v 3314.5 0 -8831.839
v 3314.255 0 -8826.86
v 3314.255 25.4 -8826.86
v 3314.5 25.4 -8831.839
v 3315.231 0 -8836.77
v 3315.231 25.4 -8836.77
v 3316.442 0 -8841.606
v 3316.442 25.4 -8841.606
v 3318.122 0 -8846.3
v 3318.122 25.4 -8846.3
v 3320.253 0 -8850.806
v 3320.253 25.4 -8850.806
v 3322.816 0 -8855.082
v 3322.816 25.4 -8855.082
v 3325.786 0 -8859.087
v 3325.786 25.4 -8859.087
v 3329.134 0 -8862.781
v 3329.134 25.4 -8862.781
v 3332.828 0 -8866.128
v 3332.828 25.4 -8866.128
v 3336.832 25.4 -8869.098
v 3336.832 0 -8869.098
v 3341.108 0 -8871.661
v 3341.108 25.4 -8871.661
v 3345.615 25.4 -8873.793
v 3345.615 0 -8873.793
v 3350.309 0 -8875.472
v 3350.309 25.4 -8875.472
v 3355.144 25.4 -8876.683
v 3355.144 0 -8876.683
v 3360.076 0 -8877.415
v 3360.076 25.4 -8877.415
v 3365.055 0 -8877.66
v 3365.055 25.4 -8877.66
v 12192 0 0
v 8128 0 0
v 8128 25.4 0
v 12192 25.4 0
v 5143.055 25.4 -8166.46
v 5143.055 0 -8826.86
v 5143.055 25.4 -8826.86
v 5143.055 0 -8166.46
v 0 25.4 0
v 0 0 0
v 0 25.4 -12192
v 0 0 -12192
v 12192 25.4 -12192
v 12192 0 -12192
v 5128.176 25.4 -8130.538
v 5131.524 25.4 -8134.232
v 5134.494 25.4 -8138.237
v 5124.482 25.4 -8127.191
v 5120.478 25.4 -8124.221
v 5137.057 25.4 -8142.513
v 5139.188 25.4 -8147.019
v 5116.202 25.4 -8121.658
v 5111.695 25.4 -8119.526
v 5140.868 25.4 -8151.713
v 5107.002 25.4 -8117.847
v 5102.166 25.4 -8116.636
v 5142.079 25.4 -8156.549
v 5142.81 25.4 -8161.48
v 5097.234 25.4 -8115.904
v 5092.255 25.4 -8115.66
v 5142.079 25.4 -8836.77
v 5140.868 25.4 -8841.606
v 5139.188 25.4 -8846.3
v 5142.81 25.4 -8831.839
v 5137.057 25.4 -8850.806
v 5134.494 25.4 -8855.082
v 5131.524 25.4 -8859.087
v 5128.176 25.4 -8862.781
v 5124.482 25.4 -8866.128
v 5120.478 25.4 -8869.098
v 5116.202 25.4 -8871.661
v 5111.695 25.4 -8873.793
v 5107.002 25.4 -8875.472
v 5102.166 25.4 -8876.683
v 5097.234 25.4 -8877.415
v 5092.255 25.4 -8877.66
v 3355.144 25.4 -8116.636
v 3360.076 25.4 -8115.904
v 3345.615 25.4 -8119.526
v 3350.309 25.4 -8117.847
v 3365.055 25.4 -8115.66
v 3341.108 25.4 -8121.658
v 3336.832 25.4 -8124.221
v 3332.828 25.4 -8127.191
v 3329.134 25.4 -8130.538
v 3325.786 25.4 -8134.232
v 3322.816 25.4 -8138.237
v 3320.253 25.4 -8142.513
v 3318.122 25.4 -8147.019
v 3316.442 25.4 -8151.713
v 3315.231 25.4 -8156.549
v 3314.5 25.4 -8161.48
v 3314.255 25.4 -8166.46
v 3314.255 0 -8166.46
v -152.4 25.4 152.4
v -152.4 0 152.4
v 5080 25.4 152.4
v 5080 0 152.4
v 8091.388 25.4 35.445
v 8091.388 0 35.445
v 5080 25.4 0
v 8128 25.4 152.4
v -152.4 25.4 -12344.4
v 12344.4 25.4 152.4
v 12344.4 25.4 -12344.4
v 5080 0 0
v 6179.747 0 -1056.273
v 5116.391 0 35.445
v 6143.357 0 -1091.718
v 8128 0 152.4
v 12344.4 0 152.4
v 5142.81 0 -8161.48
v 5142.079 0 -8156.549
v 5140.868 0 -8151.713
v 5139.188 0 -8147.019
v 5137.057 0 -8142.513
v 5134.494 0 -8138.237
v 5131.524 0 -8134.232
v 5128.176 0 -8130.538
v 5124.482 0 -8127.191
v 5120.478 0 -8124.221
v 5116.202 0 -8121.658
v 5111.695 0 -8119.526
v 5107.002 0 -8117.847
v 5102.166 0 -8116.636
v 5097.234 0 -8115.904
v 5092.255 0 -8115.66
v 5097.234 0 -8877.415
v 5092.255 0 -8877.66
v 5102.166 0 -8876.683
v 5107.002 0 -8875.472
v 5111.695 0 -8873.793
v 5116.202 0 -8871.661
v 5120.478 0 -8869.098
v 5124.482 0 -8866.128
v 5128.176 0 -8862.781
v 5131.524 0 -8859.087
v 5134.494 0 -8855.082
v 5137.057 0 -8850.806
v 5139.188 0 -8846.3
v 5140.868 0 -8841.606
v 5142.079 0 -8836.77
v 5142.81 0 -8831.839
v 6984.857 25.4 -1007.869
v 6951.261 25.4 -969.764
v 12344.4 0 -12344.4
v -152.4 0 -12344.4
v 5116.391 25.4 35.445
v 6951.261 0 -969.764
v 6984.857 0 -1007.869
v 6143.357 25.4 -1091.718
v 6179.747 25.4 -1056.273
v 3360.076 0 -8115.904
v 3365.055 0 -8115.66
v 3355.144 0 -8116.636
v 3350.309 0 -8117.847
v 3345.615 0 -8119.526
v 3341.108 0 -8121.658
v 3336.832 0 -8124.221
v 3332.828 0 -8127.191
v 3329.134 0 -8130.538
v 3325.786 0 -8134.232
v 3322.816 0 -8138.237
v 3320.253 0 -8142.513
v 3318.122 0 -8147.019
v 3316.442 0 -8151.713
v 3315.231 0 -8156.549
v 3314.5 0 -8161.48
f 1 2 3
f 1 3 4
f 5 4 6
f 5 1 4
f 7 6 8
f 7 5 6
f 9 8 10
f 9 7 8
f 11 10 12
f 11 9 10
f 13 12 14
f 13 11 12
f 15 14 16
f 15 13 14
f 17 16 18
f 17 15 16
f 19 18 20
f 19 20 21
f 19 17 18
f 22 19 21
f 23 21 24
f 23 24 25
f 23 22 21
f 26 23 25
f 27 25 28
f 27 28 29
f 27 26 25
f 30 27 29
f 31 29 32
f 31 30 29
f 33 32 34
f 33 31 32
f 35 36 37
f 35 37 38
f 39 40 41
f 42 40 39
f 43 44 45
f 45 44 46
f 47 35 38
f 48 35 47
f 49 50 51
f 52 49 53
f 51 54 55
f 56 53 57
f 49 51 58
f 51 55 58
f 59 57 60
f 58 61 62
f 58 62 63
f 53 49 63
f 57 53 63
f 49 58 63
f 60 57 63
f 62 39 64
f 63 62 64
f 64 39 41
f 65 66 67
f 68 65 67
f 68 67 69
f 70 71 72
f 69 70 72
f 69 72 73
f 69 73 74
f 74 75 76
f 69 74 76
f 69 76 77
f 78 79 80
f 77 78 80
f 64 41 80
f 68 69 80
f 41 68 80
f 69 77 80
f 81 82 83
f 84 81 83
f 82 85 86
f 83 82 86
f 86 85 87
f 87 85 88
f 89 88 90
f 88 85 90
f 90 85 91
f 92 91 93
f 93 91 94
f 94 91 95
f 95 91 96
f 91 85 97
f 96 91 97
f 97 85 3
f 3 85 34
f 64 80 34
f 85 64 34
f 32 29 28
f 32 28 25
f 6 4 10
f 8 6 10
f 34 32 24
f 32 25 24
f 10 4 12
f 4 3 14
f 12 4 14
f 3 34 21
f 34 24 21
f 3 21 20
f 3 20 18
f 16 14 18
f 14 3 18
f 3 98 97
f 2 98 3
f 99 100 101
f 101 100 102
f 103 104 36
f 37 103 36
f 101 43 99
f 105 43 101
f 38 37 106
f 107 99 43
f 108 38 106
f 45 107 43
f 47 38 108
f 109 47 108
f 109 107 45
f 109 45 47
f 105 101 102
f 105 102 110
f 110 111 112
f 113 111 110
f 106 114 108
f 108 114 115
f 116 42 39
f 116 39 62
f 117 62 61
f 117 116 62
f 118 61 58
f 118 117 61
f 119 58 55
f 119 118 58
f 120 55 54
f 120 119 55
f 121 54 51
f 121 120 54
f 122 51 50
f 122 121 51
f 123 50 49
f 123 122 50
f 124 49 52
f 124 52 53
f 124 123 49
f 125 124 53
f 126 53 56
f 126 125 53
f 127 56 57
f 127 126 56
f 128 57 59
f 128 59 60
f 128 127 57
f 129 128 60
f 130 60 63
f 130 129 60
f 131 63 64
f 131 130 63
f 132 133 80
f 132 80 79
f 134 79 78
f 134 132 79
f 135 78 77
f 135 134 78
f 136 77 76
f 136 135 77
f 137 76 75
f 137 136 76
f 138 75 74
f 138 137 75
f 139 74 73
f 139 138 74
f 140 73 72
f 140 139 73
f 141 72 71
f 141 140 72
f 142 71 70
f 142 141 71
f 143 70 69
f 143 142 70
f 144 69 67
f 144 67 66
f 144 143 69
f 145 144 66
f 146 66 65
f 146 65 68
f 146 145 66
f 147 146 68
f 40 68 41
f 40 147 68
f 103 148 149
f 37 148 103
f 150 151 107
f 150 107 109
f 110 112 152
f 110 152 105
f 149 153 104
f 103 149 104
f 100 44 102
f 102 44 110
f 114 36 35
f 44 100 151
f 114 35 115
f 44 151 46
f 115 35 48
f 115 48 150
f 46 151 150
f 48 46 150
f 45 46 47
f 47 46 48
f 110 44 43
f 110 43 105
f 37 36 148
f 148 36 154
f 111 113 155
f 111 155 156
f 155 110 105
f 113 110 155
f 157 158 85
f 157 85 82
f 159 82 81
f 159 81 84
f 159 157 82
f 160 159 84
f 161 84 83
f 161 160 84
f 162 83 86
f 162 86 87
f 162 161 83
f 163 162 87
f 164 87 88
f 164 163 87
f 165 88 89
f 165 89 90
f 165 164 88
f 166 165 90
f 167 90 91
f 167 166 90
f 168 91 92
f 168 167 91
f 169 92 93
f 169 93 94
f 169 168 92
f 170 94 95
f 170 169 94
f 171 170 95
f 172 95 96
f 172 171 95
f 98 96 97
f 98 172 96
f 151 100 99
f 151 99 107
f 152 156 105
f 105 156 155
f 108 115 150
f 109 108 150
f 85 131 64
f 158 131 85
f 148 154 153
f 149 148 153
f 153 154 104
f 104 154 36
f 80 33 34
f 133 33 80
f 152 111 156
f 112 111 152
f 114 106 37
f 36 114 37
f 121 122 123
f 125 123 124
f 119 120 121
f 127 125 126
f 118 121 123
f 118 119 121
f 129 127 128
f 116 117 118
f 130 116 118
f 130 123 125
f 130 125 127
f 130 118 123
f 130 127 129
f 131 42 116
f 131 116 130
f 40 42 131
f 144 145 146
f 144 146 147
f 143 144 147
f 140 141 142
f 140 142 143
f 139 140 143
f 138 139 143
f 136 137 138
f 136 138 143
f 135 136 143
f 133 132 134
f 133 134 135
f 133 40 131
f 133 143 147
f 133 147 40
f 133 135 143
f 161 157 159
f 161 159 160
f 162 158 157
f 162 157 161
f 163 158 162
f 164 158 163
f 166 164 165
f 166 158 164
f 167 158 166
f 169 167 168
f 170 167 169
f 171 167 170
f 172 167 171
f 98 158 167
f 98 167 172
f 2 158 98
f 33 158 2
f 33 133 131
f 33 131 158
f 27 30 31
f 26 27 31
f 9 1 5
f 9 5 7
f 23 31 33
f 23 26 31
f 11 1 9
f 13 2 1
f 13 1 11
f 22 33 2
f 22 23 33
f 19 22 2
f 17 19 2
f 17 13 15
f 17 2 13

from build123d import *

# Parameters (mm, degrees)
SKETCH1_W           = 12496.8
SKETCH1_H           = 12496.8
SKETCH1_W_2         = 12192
SKETCH1_H_2         = 12192
OUTSIDE_PERIM_DEPTH = 25.4
SKETCH2_W           = 3048
SKETCH2_H           = 152.4
DOORWAY_DEPTH       = 26.4
TABLE_DEPTH         = 25.4
DOORS_DEPTH         = 25.4
DOORS_2_DEPTH       = 25.4


with BuildPart() as part:
    # Sketch1 → Outside_Perim (new body)
    with BuildSketch(Plane(origin=(0, 0, 0), x_dir=(1, 0, 0), z_dir=(0, 1, 0))):
        with Locations((6096, 6096)):
            Rectangle(SKETCH1_W, SKETCH1_H)
        with Locations((6096, 6096)):
            Rectangle(SKETCH1_W_2, SKETCH1_H_2, mode=Mode.SUBTRACT)
    extrude(amount=OUTSIDE_PERIM_DEPTH)

    # Sketch2 → Doorway (cut, through all)
    with BuildSketch(Plane(origin=(0, 25.4, 0), x_dir=(1, 0, 0), z_dir=(0, 1, 0))):
        with Locations((6604, -76.2)):
            Rectangle(SKETCH2_W, SKETCH2_H)
    extrude(amount=-DOORWAY_DEPTH, mode=Mode.SUBTRACT)


with BuildPart() as body_2:
    # Sketch3 → Table (new body)
    with BuildSketch(Plane(origin=(0, 0, 0), x_dir=(1, 0, 0), z_dir=(0, 1, 0))):
        with BuildLine():
            Line((3365.055060067, 8877.659504367), (5092.255060067, 8877.659504367))
            ThreePointArc((5092.255060067, 8877.659504367), (5128.176084551, 8862.780528852), (5143.055060067, 8826.859504367))
            Line((5143.055060067, 8826.859504367), (5143.055060067, 8166.459504367))
            ThreePointArc((5143.055060067, 8166.459504367), (5128.176084551, 8130.538479883), (5092.255060067, 8115.659504367))
            Line((5092.255060067, 8115.659504367), (3365.055060067, 8115.659504367))
            ThreePointArc((3365.055060067, 8115.659504367), (3329.134035583, 8130.538479883), (3314.255060067, 8166.459504367))
            Line((3314.255060067, 8166.459504367), (3314.255060067, 8826.859504367))
            ThreePointArc((3314.255060067, 8826.859504367), (3329.134035583, 8862.780528852), (3365.055060067, 8877.659504367))
        make_face()
    extrude(amount=TABLE_DEPTH)


with BuildPart() as body_3:
    # Sketch4 → Doors (new body)
    with BuildSketch(Plane(origin=(0, 0, 0), x_dir=(1, 0, 0), z_dir=(0, 1, 0))):
        Polygon((5080, 0), (6143.356590999, 1091.718260532), (6179.747199683, 1056.273040832), (5116.390608684, -35.4452197), align=None)
    extrude(amount=DOORS_DEPTH)


with BuildPart() as body_4:
    # Sketch4 → Doors 2 (new body)
    with BuildSketch(Plane(origin=(0, 0, 0), x_dir=(1, 0, 0), z_dir=(0, 1, 0))):
        Polygon((8128, 0), (6984.857103754, 1007.869197248), (6951.261463845, 969.76443404), (8091.387859263, -35.4452197), align=None)
    extrude(amount=DOORS_2_DEPTH)


solid = Compound([part.part, body_2.part, body_3.part, body_4.part])
